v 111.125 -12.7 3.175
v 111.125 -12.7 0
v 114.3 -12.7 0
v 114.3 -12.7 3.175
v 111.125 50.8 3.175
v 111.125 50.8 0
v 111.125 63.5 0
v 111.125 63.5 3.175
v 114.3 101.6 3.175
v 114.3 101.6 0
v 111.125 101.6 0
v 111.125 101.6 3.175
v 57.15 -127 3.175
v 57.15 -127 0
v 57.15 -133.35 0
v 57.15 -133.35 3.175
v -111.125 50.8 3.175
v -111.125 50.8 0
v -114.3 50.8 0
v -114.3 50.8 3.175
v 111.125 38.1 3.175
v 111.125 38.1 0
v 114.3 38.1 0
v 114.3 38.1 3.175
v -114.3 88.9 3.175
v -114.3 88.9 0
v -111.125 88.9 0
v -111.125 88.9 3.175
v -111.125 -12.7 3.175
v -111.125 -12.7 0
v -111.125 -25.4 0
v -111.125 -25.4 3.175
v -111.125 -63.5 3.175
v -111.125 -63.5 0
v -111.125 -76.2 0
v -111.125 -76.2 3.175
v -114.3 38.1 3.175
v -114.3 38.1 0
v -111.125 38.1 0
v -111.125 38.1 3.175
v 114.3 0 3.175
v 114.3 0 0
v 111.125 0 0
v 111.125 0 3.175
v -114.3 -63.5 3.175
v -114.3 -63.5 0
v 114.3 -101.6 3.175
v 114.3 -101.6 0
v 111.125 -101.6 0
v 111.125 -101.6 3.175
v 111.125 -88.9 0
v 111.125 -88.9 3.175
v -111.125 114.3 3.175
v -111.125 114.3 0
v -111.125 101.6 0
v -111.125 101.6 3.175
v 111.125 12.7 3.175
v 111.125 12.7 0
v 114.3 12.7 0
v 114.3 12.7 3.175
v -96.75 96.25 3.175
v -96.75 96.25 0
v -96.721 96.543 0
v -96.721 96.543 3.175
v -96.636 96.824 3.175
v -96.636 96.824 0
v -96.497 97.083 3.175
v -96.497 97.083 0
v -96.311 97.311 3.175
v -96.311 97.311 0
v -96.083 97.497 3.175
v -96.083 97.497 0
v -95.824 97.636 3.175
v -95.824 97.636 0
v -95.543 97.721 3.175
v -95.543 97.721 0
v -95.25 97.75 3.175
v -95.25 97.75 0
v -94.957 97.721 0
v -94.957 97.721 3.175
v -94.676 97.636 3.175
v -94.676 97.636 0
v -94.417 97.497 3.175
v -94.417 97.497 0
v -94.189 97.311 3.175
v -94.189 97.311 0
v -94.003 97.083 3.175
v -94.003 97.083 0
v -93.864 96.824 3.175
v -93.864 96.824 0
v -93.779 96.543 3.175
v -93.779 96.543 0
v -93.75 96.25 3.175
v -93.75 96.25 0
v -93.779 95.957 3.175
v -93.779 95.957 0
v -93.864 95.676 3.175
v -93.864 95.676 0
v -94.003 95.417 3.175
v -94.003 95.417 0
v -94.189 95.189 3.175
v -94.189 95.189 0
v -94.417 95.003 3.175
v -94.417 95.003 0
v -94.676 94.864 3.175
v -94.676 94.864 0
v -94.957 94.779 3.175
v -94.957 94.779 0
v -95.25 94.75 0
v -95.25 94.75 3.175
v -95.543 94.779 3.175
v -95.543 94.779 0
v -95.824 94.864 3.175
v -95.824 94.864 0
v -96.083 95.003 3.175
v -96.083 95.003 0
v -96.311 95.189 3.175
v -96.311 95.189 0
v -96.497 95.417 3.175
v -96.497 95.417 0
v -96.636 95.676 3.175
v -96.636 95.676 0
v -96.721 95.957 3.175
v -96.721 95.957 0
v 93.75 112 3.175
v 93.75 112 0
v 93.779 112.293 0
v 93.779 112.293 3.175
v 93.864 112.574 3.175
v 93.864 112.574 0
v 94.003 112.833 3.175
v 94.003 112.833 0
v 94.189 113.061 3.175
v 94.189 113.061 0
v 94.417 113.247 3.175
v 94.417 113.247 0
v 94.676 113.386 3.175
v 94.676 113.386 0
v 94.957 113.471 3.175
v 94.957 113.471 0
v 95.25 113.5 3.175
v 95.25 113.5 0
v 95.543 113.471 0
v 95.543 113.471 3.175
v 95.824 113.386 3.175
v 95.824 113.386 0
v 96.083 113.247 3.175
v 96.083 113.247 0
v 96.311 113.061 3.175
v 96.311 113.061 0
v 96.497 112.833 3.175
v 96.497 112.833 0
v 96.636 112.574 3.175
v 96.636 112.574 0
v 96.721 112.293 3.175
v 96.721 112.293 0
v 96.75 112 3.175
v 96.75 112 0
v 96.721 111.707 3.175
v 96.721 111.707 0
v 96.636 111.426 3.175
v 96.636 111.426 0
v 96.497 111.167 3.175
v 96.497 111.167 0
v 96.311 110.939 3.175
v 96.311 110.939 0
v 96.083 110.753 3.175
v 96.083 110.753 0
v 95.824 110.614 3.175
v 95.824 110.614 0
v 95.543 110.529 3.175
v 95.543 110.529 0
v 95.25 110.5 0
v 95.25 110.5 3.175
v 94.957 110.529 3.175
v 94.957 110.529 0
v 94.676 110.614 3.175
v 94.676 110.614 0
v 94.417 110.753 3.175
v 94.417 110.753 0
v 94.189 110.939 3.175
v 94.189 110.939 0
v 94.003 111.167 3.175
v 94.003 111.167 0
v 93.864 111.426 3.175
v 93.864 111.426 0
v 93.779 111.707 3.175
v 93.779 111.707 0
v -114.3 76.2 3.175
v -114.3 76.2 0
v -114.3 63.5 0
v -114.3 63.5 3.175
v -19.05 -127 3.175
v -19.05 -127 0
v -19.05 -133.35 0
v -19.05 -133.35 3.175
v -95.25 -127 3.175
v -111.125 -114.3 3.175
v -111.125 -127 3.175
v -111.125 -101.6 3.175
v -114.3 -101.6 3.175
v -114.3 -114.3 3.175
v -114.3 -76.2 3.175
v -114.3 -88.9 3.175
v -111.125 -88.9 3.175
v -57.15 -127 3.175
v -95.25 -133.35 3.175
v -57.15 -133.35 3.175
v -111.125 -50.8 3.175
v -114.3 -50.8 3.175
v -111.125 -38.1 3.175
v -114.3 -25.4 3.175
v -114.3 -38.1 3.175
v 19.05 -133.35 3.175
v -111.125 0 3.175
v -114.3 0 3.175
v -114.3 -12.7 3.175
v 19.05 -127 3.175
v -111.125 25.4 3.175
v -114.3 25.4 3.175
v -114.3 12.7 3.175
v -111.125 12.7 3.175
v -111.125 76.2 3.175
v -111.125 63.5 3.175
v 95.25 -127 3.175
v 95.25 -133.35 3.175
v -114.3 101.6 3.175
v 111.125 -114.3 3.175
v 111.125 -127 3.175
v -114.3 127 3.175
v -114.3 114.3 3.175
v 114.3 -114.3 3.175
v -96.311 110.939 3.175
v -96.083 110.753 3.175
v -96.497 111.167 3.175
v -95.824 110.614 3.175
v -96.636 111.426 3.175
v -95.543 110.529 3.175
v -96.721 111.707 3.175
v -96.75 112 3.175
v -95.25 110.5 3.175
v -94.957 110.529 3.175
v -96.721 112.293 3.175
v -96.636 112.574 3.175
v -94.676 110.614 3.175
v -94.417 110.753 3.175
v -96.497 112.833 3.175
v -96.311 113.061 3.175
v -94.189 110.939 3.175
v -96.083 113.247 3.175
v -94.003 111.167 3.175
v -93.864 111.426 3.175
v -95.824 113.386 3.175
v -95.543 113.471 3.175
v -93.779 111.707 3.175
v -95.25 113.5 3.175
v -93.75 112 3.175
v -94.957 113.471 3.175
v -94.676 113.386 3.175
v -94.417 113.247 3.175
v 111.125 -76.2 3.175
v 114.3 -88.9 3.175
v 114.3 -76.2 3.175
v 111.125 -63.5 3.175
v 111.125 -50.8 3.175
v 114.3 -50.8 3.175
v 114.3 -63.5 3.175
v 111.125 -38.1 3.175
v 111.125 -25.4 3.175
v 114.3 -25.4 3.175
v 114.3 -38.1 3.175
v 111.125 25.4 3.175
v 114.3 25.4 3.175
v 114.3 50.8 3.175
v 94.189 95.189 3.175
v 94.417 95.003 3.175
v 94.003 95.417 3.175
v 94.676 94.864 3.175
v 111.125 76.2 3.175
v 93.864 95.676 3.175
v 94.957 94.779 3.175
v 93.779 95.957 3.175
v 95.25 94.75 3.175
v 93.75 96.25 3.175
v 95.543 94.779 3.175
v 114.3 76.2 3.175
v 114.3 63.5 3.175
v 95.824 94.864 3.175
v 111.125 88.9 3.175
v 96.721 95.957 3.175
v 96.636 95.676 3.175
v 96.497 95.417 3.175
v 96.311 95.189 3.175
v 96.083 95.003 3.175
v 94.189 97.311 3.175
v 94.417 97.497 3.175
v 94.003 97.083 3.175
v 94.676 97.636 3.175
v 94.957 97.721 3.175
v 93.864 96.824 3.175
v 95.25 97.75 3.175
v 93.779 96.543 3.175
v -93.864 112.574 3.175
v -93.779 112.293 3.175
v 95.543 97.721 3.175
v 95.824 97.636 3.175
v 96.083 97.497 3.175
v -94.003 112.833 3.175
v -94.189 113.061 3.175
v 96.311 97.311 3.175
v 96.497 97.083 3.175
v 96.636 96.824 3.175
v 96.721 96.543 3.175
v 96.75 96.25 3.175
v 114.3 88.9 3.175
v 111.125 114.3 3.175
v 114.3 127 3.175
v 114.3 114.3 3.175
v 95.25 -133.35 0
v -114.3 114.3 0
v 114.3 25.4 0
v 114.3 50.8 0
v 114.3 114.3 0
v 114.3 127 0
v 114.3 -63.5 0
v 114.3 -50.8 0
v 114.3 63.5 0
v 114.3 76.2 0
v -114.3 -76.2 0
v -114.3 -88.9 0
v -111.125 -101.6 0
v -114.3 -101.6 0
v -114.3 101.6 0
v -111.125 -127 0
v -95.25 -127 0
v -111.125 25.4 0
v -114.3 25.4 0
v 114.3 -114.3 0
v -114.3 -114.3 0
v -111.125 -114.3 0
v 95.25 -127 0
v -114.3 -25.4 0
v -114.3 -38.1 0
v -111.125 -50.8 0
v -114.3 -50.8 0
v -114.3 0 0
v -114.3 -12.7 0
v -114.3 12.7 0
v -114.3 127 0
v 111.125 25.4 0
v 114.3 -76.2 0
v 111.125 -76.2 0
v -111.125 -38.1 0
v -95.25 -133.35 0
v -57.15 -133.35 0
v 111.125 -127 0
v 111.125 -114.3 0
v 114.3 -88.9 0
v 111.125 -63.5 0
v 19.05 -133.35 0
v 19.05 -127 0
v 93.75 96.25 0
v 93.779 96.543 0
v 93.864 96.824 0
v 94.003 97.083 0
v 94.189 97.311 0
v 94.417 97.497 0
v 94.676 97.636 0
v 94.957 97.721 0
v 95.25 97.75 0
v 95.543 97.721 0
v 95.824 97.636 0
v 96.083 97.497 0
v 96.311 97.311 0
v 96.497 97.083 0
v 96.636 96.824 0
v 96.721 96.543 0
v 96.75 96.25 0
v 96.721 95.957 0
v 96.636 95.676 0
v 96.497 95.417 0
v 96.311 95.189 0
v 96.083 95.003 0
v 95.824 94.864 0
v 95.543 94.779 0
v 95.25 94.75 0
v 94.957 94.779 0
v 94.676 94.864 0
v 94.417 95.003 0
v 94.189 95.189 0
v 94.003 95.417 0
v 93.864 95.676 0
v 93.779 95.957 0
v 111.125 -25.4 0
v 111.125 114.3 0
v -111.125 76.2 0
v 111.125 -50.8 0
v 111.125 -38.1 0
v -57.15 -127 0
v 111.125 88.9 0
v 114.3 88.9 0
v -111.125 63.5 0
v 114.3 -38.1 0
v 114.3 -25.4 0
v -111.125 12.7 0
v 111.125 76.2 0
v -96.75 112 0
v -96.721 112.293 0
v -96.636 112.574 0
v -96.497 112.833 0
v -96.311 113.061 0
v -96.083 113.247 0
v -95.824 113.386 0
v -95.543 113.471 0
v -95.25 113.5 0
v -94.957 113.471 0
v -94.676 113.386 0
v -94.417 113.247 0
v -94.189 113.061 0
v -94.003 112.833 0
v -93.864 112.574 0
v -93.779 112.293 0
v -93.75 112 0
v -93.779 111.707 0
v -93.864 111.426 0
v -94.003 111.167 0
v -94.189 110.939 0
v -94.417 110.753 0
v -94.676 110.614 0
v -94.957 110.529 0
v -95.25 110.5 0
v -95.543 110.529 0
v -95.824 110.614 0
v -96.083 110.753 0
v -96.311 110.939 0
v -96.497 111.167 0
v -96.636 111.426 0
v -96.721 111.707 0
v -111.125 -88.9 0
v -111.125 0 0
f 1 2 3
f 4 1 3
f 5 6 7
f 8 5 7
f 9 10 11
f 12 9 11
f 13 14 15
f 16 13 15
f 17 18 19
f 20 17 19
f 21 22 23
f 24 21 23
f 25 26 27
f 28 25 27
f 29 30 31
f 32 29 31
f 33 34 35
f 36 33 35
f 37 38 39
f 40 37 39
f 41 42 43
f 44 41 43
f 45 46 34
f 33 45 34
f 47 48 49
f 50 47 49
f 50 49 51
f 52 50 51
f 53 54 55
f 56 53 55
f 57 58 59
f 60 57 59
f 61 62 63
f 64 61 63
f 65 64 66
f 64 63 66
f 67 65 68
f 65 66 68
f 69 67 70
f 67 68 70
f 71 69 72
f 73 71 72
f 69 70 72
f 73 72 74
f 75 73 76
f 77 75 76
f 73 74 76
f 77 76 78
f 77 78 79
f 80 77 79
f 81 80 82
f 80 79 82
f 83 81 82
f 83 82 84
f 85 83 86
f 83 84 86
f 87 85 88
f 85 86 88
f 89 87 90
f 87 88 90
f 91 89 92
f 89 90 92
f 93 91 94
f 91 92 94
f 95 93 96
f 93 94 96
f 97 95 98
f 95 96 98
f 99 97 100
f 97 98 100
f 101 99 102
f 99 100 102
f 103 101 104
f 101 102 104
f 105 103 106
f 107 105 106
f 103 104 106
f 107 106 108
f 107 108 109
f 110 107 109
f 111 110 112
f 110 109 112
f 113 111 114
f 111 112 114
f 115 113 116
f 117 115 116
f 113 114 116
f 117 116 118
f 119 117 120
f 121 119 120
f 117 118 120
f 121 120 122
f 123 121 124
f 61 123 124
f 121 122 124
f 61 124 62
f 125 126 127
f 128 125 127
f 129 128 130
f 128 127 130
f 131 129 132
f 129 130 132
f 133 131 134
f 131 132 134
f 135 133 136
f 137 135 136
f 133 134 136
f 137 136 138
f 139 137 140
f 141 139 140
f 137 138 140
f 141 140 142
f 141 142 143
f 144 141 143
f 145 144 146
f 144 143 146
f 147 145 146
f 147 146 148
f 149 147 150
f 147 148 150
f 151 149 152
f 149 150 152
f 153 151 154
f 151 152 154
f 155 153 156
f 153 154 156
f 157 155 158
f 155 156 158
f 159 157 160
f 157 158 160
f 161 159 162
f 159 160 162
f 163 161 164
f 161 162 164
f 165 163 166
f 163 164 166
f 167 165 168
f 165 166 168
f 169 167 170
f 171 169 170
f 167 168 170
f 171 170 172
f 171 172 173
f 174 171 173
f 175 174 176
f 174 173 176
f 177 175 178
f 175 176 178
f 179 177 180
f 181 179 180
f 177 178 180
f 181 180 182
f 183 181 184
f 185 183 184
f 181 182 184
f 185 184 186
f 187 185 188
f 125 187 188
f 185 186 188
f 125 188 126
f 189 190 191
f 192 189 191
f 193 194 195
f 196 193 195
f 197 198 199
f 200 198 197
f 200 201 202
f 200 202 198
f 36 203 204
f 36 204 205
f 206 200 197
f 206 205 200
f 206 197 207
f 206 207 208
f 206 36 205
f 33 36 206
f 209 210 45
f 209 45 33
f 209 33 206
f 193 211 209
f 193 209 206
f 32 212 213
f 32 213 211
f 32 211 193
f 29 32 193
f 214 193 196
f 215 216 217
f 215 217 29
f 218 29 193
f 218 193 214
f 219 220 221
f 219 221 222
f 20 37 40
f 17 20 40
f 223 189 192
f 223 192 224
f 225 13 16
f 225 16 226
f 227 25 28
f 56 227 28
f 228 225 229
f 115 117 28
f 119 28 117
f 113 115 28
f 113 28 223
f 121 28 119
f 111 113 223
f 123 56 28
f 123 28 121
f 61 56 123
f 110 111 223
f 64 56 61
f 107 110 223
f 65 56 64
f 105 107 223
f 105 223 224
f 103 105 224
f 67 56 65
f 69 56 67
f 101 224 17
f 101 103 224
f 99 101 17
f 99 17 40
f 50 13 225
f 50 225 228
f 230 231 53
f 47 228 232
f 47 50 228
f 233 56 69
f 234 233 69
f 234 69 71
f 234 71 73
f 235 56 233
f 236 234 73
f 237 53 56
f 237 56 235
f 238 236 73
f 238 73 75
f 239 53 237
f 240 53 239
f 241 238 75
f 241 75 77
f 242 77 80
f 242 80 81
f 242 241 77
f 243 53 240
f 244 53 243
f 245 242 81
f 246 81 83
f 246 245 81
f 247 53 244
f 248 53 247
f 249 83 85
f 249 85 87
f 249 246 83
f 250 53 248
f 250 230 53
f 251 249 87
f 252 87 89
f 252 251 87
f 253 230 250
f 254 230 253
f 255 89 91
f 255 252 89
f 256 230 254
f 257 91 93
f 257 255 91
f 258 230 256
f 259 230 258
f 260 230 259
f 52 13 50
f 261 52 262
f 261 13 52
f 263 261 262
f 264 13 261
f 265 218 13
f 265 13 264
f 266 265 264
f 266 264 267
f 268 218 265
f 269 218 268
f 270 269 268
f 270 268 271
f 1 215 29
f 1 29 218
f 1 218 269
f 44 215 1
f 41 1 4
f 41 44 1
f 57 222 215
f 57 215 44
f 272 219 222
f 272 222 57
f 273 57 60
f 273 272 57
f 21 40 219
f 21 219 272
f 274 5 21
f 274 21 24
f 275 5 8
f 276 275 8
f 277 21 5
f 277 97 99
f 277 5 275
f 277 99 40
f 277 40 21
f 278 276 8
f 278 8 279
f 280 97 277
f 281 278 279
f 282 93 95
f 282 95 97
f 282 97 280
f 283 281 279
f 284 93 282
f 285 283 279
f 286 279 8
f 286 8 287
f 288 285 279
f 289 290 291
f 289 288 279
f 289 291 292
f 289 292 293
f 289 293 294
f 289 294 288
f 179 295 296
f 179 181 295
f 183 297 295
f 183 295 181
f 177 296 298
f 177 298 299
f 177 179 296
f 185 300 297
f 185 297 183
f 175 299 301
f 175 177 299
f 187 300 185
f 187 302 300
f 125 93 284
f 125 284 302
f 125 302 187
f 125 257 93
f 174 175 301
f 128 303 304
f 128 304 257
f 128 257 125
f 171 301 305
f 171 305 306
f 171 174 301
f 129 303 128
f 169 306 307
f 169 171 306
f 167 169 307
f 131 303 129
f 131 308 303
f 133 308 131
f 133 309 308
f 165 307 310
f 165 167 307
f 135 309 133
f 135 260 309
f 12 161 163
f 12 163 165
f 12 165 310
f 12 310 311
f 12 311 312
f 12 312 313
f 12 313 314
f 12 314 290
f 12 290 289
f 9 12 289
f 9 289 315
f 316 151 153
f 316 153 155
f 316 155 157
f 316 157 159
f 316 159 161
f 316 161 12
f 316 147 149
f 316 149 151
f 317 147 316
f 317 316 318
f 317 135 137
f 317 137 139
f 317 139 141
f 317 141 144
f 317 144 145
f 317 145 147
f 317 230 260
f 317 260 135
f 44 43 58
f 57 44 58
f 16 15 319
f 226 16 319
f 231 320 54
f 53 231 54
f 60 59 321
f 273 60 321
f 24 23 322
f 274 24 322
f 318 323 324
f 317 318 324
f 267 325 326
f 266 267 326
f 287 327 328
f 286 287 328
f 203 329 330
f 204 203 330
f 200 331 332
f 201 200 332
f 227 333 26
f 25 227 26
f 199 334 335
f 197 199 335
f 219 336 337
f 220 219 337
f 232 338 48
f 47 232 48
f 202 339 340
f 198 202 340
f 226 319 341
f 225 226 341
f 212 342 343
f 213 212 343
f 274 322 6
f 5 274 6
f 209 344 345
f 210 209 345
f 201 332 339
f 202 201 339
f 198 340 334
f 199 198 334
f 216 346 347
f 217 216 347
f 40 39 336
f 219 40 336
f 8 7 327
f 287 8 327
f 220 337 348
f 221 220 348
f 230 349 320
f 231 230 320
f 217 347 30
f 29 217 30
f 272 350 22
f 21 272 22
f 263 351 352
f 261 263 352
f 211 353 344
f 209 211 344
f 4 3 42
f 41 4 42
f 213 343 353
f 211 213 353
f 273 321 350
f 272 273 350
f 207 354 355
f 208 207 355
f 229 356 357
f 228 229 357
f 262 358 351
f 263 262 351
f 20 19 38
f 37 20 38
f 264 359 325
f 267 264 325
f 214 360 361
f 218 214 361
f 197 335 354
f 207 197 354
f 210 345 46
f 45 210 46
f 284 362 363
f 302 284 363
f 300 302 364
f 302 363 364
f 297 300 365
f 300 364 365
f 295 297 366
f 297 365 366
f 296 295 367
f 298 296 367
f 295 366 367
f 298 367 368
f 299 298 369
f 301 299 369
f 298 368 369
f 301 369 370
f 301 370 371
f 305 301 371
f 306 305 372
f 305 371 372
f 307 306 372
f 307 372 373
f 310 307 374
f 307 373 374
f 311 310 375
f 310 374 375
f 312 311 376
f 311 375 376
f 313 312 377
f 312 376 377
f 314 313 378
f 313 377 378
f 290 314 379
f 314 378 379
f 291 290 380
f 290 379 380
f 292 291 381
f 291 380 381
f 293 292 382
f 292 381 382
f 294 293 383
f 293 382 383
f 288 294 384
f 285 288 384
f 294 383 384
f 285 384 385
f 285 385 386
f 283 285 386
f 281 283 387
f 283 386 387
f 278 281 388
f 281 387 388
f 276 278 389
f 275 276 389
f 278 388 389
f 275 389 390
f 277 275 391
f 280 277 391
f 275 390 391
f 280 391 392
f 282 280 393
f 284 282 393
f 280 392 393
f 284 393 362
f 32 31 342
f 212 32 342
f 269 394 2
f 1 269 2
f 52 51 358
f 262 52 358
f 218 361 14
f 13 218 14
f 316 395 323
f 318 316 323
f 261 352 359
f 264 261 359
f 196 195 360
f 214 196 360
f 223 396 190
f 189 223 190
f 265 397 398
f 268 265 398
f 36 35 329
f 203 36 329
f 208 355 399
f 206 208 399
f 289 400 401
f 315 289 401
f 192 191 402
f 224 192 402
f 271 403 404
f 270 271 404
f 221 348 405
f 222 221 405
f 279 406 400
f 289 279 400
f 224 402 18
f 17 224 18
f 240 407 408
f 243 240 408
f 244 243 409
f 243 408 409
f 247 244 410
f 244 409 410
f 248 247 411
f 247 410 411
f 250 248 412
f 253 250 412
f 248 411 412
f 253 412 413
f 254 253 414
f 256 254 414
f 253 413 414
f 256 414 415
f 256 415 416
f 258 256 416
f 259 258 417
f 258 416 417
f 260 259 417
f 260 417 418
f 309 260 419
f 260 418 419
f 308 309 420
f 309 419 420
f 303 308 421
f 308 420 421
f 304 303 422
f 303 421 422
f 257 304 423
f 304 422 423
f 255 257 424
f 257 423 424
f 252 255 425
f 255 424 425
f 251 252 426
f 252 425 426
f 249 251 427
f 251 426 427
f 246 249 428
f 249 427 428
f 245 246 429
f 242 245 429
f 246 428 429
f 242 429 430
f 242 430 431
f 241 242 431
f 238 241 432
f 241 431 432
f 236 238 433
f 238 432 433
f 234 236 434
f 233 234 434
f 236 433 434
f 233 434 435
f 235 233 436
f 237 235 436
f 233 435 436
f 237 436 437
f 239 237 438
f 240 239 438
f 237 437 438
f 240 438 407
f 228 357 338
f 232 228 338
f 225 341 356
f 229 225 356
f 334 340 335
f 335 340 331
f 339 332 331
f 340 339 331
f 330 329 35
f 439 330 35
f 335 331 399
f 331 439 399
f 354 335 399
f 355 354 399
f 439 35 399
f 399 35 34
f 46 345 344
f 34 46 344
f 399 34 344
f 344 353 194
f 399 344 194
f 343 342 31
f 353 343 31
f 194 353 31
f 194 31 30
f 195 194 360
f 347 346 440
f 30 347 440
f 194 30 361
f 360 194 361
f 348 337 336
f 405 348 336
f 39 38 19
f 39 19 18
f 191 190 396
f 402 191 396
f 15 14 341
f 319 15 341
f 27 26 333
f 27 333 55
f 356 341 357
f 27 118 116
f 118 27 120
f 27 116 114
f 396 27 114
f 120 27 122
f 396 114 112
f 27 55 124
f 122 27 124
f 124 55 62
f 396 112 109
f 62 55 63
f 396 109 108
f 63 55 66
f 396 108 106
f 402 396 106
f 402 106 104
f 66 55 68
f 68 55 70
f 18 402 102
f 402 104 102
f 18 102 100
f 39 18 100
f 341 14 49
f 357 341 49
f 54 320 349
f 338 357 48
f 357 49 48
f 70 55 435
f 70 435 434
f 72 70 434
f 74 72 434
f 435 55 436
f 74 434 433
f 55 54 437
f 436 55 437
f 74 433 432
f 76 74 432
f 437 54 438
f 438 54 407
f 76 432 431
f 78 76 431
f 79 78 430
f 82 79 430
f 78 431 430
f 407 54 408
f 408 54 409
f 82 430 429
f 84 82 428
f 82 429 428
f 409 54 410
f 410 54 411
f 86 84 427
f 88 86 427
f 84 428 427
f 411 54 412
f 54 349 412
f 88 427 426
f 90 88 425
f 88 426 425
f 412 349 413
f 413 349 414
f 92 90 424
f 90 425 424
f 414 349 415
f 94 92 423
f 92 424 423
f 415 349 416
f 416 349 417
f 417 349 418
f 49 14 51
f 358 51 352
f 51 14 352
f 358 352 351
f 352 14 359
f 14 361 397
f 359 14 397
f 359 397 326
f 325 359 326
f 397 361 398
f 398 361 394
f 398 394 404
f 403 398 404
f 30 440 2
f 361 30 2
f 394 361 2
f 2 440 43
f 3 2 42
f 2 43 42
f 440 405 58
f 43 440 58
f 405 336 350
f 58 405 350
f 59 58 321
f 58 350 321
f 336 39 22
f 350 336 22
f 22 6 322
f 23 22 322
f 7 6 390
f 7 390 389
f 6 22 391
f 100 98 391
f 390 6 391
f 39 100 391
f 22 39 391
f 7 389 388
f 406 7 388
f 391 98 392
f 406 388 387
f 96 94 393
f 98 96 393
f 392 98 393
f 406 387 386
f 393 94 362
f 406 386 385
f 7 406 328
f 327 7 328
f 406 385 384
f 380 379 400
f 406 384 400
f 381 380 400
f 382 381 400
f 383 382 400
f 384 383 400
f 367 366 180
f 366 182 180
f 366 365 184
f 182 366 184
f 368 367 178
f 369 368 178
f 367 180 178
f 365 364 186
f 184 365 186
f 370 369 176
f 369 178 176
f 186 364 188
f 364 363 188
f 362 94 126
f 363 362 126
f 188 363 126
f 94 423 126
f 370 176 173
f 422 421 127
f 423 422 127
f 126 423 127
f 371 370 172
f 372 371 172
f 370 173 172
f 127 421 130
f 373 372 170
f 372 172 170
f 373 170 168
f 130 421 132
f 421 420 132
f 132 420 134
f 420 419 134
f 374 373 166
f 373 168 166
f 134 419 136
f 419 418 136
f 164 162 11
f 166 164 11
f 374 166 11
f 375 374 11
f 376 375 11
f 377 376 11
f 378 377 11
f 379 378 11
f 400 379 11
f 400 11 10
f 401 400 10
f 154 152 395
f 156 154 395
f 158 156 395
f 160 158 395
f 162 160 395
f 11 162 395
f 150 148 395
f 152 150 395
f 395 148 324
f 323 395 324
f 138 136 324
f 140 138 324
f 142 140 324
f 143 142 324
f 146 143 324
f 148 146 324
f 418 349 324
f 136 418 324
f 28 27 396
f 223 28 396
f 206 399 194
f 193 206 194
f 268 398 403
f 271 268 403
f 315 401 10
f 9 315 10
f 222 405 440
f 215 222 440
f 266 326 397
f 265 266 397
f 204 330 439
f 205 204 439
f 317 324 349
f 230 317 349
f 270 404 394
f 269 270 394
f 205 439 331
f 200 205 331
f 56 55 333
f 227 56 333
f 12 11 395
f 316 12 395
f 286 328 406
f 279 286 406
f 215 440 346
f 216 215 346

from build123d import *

# Parameters (mm, degrees)
BOSS_EXTRUDE1_DEPTH = 3.175
SKETCH3_R           = 1.5
CUT_EXTRUDE1_DEPTH  = 3.175


with BuildPart() as part:
    # Sketch1 → Boss-Extrude1 (new body)
    with BuildSketch(Plane.XY):
        Polygon((-114.3, 127), (-114.3, 114.3), (-111.125, 114.3), (-111.125, 101.6), (-114.3, 101.6), (-114.3, 88.9), (-111.125, 88.9), (-111.125, 76.2), (-114.3, 76.2), (-114.3, 63.5), (-111.125, 63.5), (-111.125, 50.8), (-114.3, 50.8), (-114.3, 38.1), (-111.125, 38.1), (-111.125, 25.4), (-114.3, 25.4), (-114.3, 12.7), (-111.125, 12.7), (-111.125, 0), (-114.3, 0), (-114.3, -12.7), (-111.125, -12.7), (-111.125, -25.4), (-114.3, -25.4), (-114.3, -38.1), (-111.125, -38.1), (-111.125, -50.8), (-114.3, -50.8), (-114.3, -63.5), (-111.125, -63.5), (-111.125, -76.2), (-114.3, -76.2), (-114.3, -88.9), (-111.125, -88.9), (-111.125, -101.6), (-114.3, -101.6), (-114.3, -114.3), (-111.125, -114.3), (-111.125, -127), (-95.25, -127), (-95.25, -133.35), (-57.15, -133.35), (-57.15, -127), (-19.05, -127), (-19.05, -133.35), (19.05, -133.35), (19.05, -127), (57.15, -127), (57.15, -133.35), (95.25, -133.35), (95.25, -127), (111.125, -127), (111.125, -114.3), (114.3, -114.3), (114.3, -101.6), (111.125, -101.6), (111.125, -88.9), (114.3, -88.9), (114.3, -76.2), (111.125, -76.2), (111.125, -63.5), (114.3, -63.5), (114.3, -50.8), (111.125, -50.8), (111.125, -38.1), (114.3, -38.1), (114.3, -25.4), (111.125, -25.4), (111.125, -12.7), (114.3, -12.7), (114.3, 0), (111.125, 0), (111.125, 12.7), (114.3, 12.7), (114.3, 25.4), (111.125, 25.4), (111.125, 38.1), (114.3, 38.1), (114.3, 50.8), (111.125, 50.8), (111.125, 63.5), (114.3, 63.5), (114.3, 76.2), (111.125, 76.2), (111.125, 88.9), (114.3, 88.9), (114.3, 101.6), (111.125, 101.6), (111.125, 114.3), (114.3, 114.3), (114.3, 127), align=None)
    extrude(amount=BOSS_EXTRUDE1_DEPTH)

    # Sketch3 → Cut-Extrude1 (cut)
    with BuildSketch(Plane(origin=(0, 0, 0), x_dir=(-1, 0, 0), z_dir=(0, 0, -1))):
        with Locations((-95.25, 112)):
            Circle(SKETCH3_R)
        with Locations((-95.25, 96.25)):
            Circle(SKETCH3_R)
        with Locations((95.25, 96.25)):
            Circle(SKETCH3_R)
        with Locations((95.25, 112)):
            Circle(SKETCH3_R)
    extrude(amount=-CUT_EXTRUDE1_DEPTH, mode=Mode.SUBTRACT)


solid = part.part
